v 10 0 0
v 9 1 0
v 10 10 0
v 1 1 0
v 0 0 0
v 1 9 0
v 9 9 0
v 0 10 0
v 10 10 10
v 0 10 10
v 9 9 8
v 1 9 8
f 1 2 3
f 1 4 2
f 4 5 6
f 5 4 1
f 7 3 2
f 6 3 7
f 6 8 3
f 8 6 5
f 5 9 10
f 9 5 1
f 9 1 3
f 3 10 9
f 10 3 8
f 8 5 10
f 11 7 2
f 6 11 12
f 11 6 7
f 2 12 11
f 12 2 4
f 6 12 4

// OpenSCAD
module gripRecess01(
  width=10,
  height=10,
  wallThickness=2,
  gripDepth=5
) {
  // make a default grip recess and finally scale it accordingly to width and height
  // outer sphere
  // inner sphere
  // cut on top
  // cut on front
  // sourrounding wall

  // scale it
  //scale([width, height, wallThickness]) {
  
    // base
    cube([1, 1, 1]);
    // sphere
    sphere(r = 10);

  //};
};

module gripRecess02() {
    
}

//gripRecess01();

 module prism(l, w, h){
       polyhedron(
               points=[[0,0,0], [l,0,0], [l,w,0], [0,w,0], [0,w,h], [l,w,h]],
               faces=[[0,1,2,3],[5,4,3,2],[0,4,5,1],[3,4,0],[5,2,1]]
               );
}

module test() {
difference() {
prism(10, 10, 10);
    translate([1, 1, 0]) {
prism(8, 8, 8);
    };
};
};

test();
